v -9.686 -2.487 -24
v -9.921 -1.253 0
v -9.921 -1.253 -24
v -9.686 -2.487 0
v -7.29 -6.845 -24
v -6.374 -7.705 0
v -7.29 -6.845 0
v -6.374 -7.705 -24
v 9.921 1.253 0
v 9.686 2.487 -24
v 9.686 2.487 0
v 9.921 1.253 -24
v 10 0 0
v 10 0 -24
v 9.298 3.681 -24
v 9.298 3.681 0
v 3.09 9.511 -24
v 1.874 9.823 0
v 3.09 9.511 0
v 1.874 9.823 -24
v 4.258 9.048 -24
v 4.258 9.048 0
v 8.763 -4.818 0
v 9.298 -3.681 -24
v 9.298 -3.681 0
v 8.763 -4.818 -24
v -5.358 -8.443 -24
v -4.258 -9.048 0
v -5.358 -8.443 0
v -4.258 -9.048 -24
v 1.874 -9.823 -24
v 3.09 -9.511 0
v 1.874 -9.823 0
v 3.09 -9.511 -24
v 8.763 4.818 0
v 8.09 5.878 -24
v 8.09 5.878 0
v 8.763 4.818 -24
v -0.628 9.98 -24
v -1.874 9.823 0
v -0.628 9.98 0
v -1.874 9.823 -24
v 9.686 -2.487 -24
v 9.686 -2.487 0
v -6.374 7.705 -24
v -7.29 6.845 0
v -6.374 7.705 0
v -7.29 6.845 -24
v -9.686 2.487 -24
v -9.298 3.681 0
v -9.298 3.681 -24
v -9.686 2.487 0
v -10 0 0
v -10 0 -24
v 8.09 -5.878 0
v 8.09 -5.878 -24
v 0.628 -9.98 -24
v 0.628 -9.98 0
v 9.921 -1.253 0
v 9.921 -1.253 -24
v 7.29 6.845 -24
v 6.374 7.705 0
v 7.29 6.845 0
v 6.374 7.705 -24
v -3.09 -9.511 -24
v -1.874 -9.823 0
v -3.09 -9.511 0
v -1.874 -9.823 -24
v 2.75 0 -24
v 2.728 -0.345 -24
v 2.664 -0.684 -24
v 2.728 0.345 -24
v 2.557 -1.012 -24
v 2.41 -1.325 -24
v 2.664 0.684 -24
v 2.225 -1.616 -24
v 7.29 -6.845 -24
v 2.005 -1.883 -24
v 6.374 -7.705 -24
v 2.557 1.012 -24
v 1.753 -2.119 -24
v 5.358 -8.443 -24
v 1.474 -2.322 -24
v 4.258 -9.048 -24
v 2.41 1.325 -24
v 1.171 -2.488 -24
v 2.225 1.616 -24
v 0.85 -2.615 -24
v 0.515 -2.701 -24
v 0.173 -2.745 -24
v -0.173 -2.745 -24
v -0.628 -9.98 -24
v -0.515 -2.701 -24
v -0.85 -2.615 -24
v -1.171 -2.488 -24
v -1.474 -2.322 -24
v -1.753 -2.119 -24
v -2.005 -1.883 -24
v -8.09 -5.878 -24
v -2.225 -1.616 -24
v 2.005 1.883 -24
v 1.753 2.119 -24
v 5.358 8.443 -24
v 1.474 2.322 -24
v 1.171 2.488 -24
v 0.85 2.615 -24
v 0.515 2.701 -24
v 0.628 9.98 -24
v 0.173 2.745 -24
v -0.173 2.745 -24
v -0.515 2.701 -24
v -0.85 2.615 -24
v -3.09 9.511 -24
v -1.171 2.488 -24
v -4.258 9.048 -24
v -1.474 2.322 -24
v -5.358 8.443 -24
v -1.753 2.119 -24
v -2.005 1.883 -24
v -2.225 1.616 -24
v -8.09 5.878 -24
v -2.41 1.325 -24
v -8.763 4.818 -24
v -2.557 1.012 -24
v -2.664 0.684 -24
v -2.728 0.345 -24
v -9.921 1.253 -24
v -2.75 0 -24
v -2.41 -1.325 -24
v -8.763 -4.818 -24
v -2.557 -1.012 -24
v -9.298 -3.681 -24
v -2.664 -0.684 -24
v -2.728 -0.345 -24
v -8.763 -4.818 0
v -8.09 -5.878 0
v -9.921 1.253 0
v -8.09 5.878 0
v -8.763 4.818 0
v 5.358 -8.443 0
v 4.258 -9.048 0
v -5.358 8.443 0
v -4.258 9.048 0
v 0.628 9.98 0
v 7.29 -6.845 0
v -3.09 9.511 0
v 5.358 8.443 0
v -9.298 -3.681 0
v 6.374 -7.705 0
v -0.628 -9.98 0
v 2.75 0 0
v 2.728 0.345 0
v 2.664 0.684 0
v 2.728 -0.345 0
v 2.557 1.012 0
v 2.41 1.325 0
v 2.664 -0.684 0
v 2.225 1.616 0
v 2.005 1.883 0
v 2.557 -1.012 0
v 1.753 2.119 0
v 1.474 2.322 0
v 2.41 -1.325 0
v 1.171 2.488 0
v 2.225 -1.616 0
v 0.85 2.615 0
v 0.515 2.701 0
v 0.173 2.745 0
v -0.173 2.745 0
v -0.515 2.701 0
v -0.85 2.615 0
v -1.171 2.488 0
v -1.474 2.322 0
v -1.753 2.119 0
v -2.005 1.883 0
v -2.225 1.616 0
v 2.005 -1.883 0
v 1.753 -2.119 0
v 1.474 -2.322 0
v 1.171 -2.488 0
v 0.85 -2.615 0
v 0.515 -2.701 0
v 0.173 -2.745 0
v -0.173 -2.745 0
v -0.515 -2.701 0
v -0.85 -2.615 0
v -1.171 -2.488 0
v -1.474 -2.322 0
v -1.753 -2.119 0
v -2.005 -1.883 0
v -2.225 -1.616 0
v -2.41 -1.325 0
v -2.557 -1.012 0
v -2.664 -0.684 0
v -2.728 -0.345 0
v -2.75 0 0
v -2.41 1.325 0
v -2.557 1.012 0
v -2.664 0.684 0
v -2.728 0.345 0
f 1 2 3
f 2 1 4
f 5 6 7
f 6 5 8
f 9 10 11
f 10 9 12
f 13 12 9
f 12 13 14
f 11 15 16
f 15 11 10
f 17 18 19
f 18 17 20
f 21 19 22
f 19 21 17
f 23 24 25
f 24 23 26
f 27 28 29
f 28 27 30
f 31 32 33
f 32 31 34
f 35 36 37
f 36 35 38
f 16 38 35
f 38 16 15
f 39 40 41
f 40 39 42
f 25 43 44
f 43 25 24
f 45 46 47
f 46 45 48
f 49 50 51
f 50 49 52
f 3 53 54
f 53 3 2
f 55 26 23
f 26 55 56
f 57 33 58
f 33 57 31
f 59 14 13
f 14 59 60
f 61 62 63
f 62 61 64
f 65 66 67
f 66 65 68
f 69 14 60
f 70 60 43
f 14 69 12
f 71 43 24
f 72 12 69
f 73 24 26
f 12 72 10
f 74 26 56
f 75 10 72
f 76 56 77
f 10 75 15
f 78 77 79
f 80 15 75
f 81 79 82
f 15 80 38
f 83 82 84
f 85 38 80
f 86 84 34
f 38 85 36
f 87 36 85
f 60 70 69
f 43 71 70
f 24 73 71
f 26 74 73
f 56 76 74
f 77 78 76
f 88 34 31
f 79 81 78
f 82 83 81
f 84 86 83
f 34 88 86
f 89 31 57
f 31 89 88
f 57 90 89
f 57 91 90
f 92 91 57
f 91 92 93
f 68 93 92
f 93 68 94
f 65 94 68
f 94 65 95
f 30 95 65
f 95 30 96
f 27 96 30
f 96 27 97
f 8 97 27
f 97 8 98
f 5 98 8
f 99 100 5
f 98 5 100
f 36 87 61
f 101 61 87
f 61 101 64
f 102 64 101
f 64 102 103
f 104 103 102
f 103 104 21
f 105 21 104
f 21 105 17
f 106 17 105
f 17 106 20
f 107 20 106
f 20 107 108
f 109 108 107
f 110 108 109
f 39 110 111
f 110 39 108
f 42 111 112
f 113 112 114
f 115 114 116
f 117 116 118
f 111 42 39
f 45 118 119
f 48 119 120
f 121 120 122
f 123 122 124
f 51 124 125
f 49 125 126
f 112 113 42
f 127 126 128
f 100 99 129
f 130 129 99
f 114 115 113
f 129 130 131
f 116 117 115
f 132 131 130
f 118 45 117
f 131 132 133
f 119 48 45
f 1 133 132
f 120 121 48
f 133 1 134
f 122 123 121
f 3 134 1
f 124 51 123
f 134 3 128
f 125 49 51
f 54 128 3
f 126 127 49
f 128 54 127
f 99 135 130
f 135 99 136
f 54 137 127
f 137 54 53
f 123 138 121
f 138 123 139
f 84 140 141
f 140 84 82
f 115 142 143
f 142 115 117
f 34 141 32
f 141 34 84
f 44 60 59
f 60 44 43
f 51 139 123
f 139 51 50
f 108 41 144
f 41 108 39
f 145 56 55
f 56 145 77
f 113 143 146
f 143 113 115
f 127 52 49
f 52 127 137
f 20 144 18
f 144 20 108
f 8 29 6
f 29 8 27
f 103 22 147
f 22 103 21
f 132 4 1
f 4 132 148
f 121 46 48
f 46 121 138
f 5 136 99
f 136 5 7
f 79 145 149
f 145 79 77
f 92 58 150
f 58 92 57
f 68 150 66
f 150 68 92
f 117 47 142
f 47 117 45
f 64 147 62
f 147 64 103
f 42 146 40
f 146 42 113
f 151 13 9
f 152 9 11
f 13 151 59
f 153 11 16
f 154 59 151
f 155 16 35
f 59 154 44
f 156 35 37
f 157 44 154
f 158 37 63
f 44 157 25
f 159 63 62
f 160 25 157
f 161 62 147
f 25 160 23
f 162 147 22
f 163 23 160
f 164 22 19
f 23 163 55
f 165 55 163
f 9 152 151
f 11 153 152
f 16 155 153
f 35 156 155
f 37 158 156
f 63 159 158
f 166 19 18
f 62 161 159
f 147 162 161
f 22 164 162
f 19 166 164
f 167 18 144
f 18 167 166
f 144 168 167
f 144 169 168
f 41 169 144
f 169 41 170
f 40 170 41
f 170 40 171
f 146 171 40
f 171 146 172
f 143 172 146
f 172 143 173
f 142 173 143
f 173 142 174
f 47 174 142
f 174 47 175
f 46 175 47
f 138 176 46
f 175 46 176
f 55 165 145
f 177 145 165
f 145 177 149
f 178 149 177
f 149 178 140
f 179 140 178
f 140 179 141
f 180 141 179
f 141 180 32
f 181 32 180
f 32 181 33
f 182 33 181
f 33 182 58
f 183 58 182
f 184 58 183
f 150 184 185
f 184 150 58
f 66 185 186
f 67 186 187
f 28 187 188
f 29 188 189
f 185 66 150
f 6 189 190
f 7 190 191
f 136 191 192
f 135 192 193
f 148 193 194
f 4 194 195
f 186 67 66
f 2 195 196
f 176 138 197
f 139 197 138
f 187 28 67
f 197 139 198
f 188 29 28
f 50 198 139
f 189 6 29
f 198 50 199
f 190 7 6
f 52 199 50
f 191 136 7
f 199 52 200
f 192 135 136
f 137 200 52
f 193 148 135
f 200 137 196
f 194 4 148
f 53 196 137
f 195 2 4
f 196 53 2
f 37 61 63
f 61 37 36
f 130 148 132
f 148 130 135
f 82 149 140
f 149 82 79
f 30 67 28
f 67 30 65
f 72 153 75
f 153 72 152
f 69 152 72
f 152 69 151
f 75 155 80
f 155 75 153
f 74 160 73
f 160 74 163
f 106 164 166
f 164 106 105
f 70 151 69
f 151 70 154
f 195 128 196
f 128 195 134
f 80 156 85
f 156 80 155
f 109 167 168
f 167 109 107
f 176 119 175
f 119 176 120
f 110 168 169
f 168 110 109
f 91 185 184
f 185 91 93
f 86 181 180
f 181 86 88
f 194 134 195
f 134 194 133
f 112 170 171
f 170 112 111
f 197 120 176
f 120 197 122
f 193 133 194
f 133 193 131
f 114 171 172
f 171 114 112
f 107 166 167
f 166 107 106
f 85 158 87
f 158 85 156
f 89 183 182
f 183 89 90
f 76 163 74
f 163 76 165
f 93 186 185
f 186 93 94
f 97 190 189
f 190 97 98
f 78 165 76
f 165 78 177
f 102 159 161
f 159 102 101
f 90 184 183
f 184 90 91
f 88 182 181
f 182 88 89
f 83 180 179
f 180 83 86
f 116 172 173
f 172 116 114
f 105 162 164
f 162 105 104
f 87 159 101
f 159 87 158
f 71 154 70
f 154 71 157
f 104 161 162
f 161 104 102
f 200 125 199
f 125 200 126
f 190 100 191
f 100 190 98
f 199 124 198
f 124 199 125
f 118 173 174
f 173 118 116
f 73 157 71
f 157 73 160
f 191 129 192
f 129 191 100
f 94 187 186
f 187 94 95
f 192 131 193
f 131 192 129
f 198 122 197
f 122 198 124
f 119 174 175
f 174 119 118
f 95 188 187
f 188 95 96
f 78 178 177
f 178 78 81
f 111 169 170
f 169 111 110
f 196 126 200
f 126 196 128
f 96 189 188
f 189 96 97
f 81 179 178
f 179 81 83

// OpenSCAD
$fn = 50;


difference() {
	union() {
		translate(v = [0, 0, -24.0000000000]) {
			cylinder(h = 24, r = 10.0000000000);
		}
		cylinder(h = 0, r = 19.0000000000);
	}
	union() {
		#translate(v = [0, 0, -24]) {
			cylinder(h = 24, r = 2.7500000000);
		}
	}
}
